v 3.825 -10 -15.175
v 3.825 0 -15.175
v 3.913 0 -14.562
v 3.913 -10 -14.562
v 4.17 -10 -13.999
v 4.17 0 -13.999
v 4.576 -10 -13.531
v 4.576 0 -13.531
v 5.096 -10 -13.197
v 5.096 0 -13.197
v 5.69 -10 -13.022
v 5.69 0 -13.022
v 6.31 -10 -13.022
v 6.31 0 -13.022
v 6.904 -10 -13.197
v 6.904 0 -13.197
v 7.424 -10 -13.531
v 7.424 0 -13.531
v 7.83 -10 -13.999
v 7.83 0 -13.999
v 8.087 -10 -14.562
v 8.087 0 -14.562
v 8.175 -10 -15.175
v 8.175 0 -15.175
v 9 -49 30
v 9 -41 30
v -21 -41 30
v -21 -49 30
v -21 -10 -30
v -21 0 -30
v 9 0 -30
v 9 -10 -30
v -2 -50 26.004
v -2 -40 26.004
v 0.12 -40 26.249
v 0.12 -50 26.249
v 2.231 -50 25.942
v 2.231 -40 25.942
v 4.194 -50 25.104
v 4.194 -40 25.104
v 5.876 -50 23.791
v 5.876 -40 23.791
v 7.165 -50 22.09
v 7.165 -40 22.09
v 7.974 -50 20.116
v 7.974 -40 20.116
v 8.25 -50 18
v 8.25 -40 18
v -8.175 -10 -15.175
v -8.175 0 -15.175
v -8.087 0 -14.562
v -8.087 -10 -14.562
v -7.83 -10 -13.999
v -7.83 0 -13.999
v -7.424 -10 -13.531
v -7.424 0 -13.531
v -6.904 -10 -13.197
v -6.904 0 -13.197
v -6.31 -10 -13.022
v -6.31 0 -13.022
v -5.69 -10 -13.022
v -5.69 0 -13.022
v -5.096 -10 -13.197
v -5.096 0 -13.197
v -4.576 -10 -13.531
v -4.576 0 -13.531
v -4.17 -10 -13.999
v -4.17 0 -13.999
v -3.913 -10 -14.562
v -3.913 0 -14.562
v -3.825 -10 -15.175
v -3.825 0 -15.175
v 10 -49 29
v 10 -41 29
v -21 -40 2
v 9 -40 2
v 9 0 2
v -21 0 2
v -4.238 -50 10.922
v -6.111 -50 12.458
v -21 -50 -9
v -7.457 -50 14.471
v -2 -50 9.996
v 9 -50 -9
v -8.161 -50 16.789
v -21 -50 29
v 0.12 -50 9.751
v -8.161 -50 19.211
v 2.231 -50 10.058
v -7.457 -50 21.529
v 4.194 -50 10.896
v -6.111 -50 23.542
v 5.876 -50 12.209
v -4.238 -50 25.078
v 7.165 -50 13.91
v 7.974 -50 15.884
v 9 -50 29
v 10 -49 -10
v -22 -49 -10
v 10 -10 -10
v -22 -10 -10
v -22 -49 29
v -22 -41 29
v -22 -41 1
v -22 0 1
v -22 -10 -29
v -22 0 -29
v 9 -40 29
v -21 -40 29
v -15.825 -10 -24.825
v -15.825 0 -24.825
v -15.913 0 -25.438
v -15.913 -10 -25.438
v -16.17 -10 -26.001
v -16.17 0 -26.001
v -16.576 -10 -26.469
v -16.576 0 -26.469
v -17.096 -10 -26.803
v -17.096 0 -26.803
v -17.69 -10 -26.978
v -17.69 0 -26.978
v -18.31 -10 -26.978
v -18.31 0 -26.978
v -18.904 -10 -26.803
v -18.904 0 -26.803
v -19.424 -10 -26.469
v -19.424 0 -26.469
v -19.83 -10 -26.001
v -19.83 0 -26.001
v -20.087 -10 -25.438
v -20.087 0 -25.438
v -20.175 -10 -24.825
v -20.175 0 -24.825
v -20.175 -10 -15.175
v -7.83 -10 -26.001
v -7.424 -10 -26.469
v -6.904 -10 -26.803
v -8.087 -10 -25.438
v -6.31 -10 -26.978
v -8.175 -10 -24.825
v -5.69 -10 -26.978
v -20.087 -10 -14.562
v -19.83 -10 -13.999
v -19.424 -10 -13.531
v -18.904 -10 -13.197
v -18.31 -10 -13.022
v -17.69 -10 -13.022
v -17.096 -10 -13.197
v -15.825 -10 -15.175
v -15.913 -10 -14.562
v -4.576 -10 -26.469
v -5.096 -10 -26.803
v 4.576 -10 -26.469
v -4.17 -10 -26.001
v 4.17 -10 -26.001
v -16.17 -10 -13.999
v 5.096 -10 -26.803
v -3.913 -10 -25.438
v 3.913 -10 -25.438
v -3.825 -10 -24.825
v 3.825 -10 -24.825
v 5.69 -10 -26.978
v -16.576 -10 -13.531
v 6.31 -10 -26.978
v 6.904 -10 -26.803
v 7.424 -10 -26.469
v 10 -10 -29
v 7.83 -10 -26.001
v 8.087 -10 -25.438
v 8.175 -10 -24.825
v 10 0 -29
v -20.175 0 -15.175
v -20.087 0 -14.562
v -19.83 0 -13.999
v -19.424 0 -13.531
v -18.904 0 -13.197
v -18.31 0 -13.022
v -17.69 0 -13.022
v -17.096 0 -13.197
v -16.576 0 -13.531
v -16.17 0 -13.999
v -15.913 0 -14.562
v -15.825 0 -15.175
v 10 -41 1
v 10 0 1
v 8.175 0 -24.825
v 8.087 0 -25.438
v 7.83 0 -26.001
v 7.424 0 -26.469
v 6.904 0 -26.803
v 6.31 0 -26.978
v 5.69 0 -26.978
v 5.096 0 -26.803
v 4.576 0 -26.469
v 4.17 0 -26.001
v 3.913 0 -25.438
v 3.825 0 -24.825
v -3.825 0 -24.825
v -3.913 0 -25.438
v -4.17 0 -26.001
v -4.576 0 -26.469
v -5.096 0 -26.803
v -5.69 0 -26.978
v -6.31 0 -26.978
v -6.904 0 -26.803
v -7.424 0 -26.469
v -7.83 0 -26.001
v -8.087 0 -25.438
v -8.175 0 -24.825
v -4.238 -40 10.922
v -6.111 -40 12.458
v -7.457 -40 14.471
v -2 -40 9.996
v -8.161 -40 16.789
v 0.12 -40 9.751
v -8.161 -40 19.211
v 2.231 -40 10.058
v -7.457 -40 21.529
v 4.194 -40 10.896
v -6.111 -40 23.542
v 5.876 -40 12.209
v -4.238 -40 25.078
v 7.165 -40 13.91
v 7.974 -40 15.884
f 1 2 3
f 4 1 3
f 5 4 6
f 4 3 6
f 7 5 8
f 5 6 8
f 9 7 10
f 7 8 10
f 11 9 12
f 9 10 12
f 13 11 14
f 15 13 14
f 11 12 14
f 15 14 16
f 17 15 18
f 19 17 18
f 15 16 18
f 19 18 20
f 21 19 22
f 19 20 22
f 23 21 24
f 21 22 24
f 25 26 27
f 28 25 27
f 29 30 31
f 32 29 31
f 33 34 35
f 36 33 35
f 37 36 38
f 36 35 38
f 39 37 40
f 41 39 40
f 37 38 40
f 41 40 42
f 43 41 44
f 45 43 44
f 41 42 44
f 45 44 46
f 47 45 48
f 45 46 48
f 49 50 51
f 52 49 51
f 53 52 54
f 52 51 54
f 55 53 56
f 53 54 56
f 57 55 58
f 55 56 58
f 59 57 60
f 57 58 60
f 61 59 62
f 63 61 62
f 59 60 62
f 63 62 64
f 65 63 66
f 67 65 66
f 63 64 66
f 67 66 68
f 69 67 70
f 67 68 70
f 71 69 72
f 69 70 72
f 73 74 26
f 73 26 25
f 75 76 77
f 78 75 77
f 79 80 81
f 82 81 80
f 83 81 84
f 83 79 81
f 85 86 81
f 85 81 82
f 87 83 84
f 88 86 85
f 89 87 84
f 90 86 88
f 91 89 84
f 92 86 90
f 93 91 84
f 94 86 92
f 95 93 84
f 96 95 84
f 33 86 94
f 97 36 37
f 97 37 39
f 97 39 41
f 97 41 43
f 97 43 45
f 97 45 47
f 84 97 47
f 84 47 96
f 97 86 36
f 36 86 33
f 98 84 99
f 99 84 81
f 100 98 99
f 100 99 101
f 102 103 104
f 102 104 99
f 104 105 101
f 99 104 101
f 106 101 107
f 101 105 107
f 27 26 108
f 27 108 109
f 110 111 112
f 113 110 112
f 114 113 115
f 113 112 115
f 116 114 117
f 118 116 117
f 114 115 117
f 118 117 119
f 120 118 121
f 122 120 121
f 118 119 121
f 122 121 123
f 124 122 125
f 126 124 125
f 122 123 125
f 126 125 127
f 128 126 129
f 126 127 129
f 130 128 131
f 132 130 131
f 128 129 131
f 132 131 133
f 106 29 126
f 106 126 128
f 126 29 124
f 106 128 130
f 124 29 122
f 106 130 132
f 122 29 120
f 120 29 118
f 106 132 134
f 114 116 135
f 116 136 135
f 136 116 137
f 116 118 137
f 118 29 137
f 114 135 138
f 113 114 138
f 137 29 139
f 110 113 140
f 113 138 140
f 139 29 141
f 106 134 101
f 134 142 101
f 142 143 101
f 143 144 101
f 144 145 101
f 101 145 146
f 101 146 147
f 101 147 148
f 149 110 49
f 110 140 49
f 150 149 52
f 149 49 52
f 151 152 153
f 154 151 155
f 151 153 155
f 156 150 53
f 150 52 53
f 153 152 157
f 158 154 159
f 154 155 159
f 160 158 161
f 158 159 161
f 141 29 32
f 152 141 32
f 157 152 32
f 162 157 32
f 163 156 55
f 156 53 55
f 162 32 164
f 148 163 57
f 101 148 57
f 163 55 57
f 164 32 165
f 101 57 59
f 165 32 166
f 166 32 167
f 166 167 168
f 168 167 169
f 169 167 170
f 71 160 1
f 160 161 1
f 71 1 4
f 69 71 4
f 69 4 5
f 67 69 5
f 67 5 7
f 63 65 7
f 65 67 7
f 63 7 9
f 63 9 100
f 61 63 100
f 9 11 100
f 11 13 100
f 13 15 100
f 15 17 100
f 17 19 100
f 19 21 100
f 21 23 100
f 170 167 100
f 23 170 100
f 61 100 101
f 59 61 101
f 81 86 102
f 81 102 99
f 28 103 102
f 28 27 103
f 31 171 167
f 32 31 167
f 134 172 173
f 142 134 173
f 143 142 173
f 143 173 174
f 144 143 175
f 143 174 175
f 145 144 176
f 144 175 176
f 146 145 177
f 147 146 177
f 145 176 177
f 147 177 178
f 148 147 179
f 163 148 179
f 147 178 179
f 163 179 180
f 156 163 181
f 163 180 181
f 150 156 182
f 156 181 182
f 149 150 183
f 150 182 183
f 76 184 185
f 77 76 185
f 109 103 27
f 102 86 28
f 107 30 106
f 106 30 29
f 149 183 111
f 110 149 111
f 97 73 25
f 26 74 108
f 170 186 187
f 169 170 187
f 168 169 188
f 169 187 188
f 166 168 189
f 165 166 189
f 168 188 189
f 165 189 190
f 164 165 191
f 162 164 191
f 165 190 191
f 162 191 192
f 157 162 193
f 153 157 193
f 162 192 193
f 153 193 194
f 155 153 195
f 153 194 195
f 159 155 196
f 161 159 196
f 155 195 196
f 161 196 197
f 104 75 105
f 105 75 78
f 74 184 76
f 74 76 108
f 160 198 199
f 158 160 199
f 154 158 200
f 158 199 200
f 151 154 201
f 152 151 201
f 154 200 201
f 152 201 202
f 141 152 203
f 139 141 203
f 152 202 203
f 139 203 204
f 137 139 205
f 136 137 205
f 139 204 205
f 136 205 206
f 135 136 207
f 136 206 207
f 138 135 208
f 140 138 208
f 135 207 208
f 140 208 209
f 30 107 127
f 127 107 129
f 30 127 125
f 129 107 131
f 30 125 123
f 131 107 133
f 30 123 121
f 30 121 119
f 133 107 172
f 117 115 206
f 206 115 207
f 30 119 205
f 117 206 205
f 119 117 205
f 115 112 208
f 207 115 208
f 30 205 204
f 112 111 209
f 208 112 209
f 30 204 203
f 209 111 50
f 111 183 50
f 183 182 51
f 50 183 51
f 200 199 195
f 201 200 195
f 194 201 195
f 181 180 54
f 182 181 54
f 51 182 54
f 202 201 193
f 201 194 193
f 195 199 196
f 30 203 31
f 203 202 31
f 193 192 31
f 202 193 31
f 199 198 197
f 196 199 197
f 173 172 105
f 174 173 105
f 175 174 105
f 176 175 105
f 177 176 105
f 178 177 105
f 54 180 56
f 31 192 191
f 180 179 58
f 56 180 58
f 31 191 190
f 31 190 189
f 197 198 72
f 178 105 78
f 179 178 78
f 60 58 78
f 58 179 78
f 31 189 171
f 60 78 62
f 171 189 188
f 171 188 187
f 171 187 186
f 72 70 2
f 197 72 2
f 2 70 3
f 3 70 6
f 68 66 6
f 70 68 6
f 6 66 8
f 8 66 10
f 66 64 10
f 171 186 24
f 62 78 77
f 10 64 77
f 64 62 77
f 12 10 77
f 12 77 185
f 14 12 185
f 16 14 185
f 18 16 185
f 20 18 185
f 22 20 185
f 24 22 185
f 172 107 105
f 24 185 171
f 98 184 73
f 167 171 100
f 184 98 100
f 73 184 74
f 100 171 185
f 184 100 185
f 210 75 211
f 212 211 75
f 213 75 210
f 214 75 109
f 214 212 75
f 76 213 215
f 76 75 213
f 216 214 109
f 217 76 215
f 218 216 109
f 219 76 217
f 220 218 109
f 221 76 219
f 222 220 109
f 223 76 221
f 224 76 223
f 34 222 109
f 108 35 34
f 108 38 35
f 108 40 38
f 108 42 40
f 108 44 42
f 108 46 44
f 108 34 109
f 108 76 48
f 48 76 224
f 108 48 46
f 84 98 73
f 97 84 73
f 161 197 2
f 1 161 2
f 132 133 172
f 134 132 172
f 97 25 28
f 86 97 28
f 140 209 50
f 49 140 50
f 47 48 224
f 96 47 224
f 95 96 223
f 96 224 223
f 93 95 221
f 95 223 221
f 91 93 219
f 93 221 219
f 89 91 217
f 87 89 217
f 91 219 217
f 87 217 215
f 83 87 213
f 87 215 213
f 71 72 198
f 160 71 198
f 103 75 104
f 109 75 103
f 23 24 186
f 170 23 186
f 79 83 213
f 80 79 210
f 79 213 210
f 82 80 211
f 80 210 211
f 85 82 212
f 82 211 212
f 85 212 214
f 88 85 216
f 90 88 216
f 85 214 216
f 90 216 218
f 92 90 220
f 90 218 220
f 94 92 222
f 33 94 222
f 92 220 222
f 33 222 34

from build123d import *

# Parameters (mm, degrees)
F1_DEPTH = 50
F2_W     = 40
F2_H     = 28
F2_H_2   = 20
F3_DEPTH = 32.001
F4_SIZE  = 1


with BuildPart() as f1:
    # F0 (on Front) → F1 (new body)
    with BuildSketch(Plane.XZ):
        with BuildLine():
            Line((-22, 30), (-22, -30))
            Line((-22, -30), (-2, -30))
            Line((-2, -30), (-2, 9.9960947032))
            ThreePointArc((-2, 9.9960947032), (-8.25, 18), (-2, 26.0039052968))
            Line((-2, 26.0039052968), (-2, 30))
            Line((-2, 30), (-22, 30))
        make_face()
        with BuildLine():
            ThreePointArc((-15.825, -24.825), (-18, -27), (-20.175, -24.825))
            Line((-20.175, -24.825), (-20.175, -15.175))
            ThreePointArc((-20.175, -15.175), (-18, -13), (-15.825, -15.175))
            Line((-15.825, -15.175), (-15.825, -24.825))
        make_face(mode=Mode.SUBTRACT)
        with BuildLine():
            ThreePointArc((-3.825, -24.825), (-6, -27), (-8.175, -24.825))
            Line((-8.175, -24.825), (-8.175, -15.175))
            ThreePointArc((-8.175, -15.175), (-6, -13), (-3.825, -15.175))
            Line((-3.825, -15.175), (-3.825, -24.825))
        make_face(mode=Mode.SUBTRACT)
        with BuildLine():
            Line((-2, 9.9960947032), (-2, -30))
            Line((-2, -30), (10, -30))
            Line((10, -30), (10, 30))
            Line((10, 30), (-2, 30))
            Line((-2, 30), (-2, 26.0039052968))
            ThreePointArc((-2, 26.0039052968), (5.0775240029, 24.5024034018), (8.25, 18))
            ThreePointArc((8.25, 18), (5.0775240029, 11.4975965982), (-2, 9.9960947032))
        make_face()
        with BuildLine():
            Line((3.825, -24.825), (3.825, -15.175))
            ThreePointArc((3.825, -15.175), (6, -13), (8.175, -15.175))
            Line((8.175, -15.175), (8.175, -24.825))
            ThreePointArc((8.175, -24.825), (6, -27), (3.825, -24.825))
        make_face(mode=Mode.SUBTRACT)
    extrude(amount=F1_DEPTH)

    # F2 (on face) → F3 (cut, through all)
    with BuildSketch(Plane.YZ.offset(10)):
        with Locations((-20, 16)):
            Rectangle(F2_W, F2_H)
        with Locations((-30, -20)):
            Rectangle(F2_W, F2_H_2)
    extrude(amount=-F3_DEPTH, mode=Mode.SUBTRACT)

    # F4
    f4_edges = [f1.edges().sort_by_distance(p)[0] for p in [
        (10, -20, 2),
        (10, -40, 16),
        (10, -45, 30),
        (10, -50, 10),
        (10, -5, -30),
        (-6, -50, 30),
        (-22, -20, 2),
        (-22, -5, -30),
        (-22, -50, 10),
        (-22, -45, 30),
        (-22, -40, 16),
        (-6, -50, -10),
        (-6, -40, 30),
    ]]
    chamfer(f4_edges, length=F4_SIZE)


solid = f1.part
